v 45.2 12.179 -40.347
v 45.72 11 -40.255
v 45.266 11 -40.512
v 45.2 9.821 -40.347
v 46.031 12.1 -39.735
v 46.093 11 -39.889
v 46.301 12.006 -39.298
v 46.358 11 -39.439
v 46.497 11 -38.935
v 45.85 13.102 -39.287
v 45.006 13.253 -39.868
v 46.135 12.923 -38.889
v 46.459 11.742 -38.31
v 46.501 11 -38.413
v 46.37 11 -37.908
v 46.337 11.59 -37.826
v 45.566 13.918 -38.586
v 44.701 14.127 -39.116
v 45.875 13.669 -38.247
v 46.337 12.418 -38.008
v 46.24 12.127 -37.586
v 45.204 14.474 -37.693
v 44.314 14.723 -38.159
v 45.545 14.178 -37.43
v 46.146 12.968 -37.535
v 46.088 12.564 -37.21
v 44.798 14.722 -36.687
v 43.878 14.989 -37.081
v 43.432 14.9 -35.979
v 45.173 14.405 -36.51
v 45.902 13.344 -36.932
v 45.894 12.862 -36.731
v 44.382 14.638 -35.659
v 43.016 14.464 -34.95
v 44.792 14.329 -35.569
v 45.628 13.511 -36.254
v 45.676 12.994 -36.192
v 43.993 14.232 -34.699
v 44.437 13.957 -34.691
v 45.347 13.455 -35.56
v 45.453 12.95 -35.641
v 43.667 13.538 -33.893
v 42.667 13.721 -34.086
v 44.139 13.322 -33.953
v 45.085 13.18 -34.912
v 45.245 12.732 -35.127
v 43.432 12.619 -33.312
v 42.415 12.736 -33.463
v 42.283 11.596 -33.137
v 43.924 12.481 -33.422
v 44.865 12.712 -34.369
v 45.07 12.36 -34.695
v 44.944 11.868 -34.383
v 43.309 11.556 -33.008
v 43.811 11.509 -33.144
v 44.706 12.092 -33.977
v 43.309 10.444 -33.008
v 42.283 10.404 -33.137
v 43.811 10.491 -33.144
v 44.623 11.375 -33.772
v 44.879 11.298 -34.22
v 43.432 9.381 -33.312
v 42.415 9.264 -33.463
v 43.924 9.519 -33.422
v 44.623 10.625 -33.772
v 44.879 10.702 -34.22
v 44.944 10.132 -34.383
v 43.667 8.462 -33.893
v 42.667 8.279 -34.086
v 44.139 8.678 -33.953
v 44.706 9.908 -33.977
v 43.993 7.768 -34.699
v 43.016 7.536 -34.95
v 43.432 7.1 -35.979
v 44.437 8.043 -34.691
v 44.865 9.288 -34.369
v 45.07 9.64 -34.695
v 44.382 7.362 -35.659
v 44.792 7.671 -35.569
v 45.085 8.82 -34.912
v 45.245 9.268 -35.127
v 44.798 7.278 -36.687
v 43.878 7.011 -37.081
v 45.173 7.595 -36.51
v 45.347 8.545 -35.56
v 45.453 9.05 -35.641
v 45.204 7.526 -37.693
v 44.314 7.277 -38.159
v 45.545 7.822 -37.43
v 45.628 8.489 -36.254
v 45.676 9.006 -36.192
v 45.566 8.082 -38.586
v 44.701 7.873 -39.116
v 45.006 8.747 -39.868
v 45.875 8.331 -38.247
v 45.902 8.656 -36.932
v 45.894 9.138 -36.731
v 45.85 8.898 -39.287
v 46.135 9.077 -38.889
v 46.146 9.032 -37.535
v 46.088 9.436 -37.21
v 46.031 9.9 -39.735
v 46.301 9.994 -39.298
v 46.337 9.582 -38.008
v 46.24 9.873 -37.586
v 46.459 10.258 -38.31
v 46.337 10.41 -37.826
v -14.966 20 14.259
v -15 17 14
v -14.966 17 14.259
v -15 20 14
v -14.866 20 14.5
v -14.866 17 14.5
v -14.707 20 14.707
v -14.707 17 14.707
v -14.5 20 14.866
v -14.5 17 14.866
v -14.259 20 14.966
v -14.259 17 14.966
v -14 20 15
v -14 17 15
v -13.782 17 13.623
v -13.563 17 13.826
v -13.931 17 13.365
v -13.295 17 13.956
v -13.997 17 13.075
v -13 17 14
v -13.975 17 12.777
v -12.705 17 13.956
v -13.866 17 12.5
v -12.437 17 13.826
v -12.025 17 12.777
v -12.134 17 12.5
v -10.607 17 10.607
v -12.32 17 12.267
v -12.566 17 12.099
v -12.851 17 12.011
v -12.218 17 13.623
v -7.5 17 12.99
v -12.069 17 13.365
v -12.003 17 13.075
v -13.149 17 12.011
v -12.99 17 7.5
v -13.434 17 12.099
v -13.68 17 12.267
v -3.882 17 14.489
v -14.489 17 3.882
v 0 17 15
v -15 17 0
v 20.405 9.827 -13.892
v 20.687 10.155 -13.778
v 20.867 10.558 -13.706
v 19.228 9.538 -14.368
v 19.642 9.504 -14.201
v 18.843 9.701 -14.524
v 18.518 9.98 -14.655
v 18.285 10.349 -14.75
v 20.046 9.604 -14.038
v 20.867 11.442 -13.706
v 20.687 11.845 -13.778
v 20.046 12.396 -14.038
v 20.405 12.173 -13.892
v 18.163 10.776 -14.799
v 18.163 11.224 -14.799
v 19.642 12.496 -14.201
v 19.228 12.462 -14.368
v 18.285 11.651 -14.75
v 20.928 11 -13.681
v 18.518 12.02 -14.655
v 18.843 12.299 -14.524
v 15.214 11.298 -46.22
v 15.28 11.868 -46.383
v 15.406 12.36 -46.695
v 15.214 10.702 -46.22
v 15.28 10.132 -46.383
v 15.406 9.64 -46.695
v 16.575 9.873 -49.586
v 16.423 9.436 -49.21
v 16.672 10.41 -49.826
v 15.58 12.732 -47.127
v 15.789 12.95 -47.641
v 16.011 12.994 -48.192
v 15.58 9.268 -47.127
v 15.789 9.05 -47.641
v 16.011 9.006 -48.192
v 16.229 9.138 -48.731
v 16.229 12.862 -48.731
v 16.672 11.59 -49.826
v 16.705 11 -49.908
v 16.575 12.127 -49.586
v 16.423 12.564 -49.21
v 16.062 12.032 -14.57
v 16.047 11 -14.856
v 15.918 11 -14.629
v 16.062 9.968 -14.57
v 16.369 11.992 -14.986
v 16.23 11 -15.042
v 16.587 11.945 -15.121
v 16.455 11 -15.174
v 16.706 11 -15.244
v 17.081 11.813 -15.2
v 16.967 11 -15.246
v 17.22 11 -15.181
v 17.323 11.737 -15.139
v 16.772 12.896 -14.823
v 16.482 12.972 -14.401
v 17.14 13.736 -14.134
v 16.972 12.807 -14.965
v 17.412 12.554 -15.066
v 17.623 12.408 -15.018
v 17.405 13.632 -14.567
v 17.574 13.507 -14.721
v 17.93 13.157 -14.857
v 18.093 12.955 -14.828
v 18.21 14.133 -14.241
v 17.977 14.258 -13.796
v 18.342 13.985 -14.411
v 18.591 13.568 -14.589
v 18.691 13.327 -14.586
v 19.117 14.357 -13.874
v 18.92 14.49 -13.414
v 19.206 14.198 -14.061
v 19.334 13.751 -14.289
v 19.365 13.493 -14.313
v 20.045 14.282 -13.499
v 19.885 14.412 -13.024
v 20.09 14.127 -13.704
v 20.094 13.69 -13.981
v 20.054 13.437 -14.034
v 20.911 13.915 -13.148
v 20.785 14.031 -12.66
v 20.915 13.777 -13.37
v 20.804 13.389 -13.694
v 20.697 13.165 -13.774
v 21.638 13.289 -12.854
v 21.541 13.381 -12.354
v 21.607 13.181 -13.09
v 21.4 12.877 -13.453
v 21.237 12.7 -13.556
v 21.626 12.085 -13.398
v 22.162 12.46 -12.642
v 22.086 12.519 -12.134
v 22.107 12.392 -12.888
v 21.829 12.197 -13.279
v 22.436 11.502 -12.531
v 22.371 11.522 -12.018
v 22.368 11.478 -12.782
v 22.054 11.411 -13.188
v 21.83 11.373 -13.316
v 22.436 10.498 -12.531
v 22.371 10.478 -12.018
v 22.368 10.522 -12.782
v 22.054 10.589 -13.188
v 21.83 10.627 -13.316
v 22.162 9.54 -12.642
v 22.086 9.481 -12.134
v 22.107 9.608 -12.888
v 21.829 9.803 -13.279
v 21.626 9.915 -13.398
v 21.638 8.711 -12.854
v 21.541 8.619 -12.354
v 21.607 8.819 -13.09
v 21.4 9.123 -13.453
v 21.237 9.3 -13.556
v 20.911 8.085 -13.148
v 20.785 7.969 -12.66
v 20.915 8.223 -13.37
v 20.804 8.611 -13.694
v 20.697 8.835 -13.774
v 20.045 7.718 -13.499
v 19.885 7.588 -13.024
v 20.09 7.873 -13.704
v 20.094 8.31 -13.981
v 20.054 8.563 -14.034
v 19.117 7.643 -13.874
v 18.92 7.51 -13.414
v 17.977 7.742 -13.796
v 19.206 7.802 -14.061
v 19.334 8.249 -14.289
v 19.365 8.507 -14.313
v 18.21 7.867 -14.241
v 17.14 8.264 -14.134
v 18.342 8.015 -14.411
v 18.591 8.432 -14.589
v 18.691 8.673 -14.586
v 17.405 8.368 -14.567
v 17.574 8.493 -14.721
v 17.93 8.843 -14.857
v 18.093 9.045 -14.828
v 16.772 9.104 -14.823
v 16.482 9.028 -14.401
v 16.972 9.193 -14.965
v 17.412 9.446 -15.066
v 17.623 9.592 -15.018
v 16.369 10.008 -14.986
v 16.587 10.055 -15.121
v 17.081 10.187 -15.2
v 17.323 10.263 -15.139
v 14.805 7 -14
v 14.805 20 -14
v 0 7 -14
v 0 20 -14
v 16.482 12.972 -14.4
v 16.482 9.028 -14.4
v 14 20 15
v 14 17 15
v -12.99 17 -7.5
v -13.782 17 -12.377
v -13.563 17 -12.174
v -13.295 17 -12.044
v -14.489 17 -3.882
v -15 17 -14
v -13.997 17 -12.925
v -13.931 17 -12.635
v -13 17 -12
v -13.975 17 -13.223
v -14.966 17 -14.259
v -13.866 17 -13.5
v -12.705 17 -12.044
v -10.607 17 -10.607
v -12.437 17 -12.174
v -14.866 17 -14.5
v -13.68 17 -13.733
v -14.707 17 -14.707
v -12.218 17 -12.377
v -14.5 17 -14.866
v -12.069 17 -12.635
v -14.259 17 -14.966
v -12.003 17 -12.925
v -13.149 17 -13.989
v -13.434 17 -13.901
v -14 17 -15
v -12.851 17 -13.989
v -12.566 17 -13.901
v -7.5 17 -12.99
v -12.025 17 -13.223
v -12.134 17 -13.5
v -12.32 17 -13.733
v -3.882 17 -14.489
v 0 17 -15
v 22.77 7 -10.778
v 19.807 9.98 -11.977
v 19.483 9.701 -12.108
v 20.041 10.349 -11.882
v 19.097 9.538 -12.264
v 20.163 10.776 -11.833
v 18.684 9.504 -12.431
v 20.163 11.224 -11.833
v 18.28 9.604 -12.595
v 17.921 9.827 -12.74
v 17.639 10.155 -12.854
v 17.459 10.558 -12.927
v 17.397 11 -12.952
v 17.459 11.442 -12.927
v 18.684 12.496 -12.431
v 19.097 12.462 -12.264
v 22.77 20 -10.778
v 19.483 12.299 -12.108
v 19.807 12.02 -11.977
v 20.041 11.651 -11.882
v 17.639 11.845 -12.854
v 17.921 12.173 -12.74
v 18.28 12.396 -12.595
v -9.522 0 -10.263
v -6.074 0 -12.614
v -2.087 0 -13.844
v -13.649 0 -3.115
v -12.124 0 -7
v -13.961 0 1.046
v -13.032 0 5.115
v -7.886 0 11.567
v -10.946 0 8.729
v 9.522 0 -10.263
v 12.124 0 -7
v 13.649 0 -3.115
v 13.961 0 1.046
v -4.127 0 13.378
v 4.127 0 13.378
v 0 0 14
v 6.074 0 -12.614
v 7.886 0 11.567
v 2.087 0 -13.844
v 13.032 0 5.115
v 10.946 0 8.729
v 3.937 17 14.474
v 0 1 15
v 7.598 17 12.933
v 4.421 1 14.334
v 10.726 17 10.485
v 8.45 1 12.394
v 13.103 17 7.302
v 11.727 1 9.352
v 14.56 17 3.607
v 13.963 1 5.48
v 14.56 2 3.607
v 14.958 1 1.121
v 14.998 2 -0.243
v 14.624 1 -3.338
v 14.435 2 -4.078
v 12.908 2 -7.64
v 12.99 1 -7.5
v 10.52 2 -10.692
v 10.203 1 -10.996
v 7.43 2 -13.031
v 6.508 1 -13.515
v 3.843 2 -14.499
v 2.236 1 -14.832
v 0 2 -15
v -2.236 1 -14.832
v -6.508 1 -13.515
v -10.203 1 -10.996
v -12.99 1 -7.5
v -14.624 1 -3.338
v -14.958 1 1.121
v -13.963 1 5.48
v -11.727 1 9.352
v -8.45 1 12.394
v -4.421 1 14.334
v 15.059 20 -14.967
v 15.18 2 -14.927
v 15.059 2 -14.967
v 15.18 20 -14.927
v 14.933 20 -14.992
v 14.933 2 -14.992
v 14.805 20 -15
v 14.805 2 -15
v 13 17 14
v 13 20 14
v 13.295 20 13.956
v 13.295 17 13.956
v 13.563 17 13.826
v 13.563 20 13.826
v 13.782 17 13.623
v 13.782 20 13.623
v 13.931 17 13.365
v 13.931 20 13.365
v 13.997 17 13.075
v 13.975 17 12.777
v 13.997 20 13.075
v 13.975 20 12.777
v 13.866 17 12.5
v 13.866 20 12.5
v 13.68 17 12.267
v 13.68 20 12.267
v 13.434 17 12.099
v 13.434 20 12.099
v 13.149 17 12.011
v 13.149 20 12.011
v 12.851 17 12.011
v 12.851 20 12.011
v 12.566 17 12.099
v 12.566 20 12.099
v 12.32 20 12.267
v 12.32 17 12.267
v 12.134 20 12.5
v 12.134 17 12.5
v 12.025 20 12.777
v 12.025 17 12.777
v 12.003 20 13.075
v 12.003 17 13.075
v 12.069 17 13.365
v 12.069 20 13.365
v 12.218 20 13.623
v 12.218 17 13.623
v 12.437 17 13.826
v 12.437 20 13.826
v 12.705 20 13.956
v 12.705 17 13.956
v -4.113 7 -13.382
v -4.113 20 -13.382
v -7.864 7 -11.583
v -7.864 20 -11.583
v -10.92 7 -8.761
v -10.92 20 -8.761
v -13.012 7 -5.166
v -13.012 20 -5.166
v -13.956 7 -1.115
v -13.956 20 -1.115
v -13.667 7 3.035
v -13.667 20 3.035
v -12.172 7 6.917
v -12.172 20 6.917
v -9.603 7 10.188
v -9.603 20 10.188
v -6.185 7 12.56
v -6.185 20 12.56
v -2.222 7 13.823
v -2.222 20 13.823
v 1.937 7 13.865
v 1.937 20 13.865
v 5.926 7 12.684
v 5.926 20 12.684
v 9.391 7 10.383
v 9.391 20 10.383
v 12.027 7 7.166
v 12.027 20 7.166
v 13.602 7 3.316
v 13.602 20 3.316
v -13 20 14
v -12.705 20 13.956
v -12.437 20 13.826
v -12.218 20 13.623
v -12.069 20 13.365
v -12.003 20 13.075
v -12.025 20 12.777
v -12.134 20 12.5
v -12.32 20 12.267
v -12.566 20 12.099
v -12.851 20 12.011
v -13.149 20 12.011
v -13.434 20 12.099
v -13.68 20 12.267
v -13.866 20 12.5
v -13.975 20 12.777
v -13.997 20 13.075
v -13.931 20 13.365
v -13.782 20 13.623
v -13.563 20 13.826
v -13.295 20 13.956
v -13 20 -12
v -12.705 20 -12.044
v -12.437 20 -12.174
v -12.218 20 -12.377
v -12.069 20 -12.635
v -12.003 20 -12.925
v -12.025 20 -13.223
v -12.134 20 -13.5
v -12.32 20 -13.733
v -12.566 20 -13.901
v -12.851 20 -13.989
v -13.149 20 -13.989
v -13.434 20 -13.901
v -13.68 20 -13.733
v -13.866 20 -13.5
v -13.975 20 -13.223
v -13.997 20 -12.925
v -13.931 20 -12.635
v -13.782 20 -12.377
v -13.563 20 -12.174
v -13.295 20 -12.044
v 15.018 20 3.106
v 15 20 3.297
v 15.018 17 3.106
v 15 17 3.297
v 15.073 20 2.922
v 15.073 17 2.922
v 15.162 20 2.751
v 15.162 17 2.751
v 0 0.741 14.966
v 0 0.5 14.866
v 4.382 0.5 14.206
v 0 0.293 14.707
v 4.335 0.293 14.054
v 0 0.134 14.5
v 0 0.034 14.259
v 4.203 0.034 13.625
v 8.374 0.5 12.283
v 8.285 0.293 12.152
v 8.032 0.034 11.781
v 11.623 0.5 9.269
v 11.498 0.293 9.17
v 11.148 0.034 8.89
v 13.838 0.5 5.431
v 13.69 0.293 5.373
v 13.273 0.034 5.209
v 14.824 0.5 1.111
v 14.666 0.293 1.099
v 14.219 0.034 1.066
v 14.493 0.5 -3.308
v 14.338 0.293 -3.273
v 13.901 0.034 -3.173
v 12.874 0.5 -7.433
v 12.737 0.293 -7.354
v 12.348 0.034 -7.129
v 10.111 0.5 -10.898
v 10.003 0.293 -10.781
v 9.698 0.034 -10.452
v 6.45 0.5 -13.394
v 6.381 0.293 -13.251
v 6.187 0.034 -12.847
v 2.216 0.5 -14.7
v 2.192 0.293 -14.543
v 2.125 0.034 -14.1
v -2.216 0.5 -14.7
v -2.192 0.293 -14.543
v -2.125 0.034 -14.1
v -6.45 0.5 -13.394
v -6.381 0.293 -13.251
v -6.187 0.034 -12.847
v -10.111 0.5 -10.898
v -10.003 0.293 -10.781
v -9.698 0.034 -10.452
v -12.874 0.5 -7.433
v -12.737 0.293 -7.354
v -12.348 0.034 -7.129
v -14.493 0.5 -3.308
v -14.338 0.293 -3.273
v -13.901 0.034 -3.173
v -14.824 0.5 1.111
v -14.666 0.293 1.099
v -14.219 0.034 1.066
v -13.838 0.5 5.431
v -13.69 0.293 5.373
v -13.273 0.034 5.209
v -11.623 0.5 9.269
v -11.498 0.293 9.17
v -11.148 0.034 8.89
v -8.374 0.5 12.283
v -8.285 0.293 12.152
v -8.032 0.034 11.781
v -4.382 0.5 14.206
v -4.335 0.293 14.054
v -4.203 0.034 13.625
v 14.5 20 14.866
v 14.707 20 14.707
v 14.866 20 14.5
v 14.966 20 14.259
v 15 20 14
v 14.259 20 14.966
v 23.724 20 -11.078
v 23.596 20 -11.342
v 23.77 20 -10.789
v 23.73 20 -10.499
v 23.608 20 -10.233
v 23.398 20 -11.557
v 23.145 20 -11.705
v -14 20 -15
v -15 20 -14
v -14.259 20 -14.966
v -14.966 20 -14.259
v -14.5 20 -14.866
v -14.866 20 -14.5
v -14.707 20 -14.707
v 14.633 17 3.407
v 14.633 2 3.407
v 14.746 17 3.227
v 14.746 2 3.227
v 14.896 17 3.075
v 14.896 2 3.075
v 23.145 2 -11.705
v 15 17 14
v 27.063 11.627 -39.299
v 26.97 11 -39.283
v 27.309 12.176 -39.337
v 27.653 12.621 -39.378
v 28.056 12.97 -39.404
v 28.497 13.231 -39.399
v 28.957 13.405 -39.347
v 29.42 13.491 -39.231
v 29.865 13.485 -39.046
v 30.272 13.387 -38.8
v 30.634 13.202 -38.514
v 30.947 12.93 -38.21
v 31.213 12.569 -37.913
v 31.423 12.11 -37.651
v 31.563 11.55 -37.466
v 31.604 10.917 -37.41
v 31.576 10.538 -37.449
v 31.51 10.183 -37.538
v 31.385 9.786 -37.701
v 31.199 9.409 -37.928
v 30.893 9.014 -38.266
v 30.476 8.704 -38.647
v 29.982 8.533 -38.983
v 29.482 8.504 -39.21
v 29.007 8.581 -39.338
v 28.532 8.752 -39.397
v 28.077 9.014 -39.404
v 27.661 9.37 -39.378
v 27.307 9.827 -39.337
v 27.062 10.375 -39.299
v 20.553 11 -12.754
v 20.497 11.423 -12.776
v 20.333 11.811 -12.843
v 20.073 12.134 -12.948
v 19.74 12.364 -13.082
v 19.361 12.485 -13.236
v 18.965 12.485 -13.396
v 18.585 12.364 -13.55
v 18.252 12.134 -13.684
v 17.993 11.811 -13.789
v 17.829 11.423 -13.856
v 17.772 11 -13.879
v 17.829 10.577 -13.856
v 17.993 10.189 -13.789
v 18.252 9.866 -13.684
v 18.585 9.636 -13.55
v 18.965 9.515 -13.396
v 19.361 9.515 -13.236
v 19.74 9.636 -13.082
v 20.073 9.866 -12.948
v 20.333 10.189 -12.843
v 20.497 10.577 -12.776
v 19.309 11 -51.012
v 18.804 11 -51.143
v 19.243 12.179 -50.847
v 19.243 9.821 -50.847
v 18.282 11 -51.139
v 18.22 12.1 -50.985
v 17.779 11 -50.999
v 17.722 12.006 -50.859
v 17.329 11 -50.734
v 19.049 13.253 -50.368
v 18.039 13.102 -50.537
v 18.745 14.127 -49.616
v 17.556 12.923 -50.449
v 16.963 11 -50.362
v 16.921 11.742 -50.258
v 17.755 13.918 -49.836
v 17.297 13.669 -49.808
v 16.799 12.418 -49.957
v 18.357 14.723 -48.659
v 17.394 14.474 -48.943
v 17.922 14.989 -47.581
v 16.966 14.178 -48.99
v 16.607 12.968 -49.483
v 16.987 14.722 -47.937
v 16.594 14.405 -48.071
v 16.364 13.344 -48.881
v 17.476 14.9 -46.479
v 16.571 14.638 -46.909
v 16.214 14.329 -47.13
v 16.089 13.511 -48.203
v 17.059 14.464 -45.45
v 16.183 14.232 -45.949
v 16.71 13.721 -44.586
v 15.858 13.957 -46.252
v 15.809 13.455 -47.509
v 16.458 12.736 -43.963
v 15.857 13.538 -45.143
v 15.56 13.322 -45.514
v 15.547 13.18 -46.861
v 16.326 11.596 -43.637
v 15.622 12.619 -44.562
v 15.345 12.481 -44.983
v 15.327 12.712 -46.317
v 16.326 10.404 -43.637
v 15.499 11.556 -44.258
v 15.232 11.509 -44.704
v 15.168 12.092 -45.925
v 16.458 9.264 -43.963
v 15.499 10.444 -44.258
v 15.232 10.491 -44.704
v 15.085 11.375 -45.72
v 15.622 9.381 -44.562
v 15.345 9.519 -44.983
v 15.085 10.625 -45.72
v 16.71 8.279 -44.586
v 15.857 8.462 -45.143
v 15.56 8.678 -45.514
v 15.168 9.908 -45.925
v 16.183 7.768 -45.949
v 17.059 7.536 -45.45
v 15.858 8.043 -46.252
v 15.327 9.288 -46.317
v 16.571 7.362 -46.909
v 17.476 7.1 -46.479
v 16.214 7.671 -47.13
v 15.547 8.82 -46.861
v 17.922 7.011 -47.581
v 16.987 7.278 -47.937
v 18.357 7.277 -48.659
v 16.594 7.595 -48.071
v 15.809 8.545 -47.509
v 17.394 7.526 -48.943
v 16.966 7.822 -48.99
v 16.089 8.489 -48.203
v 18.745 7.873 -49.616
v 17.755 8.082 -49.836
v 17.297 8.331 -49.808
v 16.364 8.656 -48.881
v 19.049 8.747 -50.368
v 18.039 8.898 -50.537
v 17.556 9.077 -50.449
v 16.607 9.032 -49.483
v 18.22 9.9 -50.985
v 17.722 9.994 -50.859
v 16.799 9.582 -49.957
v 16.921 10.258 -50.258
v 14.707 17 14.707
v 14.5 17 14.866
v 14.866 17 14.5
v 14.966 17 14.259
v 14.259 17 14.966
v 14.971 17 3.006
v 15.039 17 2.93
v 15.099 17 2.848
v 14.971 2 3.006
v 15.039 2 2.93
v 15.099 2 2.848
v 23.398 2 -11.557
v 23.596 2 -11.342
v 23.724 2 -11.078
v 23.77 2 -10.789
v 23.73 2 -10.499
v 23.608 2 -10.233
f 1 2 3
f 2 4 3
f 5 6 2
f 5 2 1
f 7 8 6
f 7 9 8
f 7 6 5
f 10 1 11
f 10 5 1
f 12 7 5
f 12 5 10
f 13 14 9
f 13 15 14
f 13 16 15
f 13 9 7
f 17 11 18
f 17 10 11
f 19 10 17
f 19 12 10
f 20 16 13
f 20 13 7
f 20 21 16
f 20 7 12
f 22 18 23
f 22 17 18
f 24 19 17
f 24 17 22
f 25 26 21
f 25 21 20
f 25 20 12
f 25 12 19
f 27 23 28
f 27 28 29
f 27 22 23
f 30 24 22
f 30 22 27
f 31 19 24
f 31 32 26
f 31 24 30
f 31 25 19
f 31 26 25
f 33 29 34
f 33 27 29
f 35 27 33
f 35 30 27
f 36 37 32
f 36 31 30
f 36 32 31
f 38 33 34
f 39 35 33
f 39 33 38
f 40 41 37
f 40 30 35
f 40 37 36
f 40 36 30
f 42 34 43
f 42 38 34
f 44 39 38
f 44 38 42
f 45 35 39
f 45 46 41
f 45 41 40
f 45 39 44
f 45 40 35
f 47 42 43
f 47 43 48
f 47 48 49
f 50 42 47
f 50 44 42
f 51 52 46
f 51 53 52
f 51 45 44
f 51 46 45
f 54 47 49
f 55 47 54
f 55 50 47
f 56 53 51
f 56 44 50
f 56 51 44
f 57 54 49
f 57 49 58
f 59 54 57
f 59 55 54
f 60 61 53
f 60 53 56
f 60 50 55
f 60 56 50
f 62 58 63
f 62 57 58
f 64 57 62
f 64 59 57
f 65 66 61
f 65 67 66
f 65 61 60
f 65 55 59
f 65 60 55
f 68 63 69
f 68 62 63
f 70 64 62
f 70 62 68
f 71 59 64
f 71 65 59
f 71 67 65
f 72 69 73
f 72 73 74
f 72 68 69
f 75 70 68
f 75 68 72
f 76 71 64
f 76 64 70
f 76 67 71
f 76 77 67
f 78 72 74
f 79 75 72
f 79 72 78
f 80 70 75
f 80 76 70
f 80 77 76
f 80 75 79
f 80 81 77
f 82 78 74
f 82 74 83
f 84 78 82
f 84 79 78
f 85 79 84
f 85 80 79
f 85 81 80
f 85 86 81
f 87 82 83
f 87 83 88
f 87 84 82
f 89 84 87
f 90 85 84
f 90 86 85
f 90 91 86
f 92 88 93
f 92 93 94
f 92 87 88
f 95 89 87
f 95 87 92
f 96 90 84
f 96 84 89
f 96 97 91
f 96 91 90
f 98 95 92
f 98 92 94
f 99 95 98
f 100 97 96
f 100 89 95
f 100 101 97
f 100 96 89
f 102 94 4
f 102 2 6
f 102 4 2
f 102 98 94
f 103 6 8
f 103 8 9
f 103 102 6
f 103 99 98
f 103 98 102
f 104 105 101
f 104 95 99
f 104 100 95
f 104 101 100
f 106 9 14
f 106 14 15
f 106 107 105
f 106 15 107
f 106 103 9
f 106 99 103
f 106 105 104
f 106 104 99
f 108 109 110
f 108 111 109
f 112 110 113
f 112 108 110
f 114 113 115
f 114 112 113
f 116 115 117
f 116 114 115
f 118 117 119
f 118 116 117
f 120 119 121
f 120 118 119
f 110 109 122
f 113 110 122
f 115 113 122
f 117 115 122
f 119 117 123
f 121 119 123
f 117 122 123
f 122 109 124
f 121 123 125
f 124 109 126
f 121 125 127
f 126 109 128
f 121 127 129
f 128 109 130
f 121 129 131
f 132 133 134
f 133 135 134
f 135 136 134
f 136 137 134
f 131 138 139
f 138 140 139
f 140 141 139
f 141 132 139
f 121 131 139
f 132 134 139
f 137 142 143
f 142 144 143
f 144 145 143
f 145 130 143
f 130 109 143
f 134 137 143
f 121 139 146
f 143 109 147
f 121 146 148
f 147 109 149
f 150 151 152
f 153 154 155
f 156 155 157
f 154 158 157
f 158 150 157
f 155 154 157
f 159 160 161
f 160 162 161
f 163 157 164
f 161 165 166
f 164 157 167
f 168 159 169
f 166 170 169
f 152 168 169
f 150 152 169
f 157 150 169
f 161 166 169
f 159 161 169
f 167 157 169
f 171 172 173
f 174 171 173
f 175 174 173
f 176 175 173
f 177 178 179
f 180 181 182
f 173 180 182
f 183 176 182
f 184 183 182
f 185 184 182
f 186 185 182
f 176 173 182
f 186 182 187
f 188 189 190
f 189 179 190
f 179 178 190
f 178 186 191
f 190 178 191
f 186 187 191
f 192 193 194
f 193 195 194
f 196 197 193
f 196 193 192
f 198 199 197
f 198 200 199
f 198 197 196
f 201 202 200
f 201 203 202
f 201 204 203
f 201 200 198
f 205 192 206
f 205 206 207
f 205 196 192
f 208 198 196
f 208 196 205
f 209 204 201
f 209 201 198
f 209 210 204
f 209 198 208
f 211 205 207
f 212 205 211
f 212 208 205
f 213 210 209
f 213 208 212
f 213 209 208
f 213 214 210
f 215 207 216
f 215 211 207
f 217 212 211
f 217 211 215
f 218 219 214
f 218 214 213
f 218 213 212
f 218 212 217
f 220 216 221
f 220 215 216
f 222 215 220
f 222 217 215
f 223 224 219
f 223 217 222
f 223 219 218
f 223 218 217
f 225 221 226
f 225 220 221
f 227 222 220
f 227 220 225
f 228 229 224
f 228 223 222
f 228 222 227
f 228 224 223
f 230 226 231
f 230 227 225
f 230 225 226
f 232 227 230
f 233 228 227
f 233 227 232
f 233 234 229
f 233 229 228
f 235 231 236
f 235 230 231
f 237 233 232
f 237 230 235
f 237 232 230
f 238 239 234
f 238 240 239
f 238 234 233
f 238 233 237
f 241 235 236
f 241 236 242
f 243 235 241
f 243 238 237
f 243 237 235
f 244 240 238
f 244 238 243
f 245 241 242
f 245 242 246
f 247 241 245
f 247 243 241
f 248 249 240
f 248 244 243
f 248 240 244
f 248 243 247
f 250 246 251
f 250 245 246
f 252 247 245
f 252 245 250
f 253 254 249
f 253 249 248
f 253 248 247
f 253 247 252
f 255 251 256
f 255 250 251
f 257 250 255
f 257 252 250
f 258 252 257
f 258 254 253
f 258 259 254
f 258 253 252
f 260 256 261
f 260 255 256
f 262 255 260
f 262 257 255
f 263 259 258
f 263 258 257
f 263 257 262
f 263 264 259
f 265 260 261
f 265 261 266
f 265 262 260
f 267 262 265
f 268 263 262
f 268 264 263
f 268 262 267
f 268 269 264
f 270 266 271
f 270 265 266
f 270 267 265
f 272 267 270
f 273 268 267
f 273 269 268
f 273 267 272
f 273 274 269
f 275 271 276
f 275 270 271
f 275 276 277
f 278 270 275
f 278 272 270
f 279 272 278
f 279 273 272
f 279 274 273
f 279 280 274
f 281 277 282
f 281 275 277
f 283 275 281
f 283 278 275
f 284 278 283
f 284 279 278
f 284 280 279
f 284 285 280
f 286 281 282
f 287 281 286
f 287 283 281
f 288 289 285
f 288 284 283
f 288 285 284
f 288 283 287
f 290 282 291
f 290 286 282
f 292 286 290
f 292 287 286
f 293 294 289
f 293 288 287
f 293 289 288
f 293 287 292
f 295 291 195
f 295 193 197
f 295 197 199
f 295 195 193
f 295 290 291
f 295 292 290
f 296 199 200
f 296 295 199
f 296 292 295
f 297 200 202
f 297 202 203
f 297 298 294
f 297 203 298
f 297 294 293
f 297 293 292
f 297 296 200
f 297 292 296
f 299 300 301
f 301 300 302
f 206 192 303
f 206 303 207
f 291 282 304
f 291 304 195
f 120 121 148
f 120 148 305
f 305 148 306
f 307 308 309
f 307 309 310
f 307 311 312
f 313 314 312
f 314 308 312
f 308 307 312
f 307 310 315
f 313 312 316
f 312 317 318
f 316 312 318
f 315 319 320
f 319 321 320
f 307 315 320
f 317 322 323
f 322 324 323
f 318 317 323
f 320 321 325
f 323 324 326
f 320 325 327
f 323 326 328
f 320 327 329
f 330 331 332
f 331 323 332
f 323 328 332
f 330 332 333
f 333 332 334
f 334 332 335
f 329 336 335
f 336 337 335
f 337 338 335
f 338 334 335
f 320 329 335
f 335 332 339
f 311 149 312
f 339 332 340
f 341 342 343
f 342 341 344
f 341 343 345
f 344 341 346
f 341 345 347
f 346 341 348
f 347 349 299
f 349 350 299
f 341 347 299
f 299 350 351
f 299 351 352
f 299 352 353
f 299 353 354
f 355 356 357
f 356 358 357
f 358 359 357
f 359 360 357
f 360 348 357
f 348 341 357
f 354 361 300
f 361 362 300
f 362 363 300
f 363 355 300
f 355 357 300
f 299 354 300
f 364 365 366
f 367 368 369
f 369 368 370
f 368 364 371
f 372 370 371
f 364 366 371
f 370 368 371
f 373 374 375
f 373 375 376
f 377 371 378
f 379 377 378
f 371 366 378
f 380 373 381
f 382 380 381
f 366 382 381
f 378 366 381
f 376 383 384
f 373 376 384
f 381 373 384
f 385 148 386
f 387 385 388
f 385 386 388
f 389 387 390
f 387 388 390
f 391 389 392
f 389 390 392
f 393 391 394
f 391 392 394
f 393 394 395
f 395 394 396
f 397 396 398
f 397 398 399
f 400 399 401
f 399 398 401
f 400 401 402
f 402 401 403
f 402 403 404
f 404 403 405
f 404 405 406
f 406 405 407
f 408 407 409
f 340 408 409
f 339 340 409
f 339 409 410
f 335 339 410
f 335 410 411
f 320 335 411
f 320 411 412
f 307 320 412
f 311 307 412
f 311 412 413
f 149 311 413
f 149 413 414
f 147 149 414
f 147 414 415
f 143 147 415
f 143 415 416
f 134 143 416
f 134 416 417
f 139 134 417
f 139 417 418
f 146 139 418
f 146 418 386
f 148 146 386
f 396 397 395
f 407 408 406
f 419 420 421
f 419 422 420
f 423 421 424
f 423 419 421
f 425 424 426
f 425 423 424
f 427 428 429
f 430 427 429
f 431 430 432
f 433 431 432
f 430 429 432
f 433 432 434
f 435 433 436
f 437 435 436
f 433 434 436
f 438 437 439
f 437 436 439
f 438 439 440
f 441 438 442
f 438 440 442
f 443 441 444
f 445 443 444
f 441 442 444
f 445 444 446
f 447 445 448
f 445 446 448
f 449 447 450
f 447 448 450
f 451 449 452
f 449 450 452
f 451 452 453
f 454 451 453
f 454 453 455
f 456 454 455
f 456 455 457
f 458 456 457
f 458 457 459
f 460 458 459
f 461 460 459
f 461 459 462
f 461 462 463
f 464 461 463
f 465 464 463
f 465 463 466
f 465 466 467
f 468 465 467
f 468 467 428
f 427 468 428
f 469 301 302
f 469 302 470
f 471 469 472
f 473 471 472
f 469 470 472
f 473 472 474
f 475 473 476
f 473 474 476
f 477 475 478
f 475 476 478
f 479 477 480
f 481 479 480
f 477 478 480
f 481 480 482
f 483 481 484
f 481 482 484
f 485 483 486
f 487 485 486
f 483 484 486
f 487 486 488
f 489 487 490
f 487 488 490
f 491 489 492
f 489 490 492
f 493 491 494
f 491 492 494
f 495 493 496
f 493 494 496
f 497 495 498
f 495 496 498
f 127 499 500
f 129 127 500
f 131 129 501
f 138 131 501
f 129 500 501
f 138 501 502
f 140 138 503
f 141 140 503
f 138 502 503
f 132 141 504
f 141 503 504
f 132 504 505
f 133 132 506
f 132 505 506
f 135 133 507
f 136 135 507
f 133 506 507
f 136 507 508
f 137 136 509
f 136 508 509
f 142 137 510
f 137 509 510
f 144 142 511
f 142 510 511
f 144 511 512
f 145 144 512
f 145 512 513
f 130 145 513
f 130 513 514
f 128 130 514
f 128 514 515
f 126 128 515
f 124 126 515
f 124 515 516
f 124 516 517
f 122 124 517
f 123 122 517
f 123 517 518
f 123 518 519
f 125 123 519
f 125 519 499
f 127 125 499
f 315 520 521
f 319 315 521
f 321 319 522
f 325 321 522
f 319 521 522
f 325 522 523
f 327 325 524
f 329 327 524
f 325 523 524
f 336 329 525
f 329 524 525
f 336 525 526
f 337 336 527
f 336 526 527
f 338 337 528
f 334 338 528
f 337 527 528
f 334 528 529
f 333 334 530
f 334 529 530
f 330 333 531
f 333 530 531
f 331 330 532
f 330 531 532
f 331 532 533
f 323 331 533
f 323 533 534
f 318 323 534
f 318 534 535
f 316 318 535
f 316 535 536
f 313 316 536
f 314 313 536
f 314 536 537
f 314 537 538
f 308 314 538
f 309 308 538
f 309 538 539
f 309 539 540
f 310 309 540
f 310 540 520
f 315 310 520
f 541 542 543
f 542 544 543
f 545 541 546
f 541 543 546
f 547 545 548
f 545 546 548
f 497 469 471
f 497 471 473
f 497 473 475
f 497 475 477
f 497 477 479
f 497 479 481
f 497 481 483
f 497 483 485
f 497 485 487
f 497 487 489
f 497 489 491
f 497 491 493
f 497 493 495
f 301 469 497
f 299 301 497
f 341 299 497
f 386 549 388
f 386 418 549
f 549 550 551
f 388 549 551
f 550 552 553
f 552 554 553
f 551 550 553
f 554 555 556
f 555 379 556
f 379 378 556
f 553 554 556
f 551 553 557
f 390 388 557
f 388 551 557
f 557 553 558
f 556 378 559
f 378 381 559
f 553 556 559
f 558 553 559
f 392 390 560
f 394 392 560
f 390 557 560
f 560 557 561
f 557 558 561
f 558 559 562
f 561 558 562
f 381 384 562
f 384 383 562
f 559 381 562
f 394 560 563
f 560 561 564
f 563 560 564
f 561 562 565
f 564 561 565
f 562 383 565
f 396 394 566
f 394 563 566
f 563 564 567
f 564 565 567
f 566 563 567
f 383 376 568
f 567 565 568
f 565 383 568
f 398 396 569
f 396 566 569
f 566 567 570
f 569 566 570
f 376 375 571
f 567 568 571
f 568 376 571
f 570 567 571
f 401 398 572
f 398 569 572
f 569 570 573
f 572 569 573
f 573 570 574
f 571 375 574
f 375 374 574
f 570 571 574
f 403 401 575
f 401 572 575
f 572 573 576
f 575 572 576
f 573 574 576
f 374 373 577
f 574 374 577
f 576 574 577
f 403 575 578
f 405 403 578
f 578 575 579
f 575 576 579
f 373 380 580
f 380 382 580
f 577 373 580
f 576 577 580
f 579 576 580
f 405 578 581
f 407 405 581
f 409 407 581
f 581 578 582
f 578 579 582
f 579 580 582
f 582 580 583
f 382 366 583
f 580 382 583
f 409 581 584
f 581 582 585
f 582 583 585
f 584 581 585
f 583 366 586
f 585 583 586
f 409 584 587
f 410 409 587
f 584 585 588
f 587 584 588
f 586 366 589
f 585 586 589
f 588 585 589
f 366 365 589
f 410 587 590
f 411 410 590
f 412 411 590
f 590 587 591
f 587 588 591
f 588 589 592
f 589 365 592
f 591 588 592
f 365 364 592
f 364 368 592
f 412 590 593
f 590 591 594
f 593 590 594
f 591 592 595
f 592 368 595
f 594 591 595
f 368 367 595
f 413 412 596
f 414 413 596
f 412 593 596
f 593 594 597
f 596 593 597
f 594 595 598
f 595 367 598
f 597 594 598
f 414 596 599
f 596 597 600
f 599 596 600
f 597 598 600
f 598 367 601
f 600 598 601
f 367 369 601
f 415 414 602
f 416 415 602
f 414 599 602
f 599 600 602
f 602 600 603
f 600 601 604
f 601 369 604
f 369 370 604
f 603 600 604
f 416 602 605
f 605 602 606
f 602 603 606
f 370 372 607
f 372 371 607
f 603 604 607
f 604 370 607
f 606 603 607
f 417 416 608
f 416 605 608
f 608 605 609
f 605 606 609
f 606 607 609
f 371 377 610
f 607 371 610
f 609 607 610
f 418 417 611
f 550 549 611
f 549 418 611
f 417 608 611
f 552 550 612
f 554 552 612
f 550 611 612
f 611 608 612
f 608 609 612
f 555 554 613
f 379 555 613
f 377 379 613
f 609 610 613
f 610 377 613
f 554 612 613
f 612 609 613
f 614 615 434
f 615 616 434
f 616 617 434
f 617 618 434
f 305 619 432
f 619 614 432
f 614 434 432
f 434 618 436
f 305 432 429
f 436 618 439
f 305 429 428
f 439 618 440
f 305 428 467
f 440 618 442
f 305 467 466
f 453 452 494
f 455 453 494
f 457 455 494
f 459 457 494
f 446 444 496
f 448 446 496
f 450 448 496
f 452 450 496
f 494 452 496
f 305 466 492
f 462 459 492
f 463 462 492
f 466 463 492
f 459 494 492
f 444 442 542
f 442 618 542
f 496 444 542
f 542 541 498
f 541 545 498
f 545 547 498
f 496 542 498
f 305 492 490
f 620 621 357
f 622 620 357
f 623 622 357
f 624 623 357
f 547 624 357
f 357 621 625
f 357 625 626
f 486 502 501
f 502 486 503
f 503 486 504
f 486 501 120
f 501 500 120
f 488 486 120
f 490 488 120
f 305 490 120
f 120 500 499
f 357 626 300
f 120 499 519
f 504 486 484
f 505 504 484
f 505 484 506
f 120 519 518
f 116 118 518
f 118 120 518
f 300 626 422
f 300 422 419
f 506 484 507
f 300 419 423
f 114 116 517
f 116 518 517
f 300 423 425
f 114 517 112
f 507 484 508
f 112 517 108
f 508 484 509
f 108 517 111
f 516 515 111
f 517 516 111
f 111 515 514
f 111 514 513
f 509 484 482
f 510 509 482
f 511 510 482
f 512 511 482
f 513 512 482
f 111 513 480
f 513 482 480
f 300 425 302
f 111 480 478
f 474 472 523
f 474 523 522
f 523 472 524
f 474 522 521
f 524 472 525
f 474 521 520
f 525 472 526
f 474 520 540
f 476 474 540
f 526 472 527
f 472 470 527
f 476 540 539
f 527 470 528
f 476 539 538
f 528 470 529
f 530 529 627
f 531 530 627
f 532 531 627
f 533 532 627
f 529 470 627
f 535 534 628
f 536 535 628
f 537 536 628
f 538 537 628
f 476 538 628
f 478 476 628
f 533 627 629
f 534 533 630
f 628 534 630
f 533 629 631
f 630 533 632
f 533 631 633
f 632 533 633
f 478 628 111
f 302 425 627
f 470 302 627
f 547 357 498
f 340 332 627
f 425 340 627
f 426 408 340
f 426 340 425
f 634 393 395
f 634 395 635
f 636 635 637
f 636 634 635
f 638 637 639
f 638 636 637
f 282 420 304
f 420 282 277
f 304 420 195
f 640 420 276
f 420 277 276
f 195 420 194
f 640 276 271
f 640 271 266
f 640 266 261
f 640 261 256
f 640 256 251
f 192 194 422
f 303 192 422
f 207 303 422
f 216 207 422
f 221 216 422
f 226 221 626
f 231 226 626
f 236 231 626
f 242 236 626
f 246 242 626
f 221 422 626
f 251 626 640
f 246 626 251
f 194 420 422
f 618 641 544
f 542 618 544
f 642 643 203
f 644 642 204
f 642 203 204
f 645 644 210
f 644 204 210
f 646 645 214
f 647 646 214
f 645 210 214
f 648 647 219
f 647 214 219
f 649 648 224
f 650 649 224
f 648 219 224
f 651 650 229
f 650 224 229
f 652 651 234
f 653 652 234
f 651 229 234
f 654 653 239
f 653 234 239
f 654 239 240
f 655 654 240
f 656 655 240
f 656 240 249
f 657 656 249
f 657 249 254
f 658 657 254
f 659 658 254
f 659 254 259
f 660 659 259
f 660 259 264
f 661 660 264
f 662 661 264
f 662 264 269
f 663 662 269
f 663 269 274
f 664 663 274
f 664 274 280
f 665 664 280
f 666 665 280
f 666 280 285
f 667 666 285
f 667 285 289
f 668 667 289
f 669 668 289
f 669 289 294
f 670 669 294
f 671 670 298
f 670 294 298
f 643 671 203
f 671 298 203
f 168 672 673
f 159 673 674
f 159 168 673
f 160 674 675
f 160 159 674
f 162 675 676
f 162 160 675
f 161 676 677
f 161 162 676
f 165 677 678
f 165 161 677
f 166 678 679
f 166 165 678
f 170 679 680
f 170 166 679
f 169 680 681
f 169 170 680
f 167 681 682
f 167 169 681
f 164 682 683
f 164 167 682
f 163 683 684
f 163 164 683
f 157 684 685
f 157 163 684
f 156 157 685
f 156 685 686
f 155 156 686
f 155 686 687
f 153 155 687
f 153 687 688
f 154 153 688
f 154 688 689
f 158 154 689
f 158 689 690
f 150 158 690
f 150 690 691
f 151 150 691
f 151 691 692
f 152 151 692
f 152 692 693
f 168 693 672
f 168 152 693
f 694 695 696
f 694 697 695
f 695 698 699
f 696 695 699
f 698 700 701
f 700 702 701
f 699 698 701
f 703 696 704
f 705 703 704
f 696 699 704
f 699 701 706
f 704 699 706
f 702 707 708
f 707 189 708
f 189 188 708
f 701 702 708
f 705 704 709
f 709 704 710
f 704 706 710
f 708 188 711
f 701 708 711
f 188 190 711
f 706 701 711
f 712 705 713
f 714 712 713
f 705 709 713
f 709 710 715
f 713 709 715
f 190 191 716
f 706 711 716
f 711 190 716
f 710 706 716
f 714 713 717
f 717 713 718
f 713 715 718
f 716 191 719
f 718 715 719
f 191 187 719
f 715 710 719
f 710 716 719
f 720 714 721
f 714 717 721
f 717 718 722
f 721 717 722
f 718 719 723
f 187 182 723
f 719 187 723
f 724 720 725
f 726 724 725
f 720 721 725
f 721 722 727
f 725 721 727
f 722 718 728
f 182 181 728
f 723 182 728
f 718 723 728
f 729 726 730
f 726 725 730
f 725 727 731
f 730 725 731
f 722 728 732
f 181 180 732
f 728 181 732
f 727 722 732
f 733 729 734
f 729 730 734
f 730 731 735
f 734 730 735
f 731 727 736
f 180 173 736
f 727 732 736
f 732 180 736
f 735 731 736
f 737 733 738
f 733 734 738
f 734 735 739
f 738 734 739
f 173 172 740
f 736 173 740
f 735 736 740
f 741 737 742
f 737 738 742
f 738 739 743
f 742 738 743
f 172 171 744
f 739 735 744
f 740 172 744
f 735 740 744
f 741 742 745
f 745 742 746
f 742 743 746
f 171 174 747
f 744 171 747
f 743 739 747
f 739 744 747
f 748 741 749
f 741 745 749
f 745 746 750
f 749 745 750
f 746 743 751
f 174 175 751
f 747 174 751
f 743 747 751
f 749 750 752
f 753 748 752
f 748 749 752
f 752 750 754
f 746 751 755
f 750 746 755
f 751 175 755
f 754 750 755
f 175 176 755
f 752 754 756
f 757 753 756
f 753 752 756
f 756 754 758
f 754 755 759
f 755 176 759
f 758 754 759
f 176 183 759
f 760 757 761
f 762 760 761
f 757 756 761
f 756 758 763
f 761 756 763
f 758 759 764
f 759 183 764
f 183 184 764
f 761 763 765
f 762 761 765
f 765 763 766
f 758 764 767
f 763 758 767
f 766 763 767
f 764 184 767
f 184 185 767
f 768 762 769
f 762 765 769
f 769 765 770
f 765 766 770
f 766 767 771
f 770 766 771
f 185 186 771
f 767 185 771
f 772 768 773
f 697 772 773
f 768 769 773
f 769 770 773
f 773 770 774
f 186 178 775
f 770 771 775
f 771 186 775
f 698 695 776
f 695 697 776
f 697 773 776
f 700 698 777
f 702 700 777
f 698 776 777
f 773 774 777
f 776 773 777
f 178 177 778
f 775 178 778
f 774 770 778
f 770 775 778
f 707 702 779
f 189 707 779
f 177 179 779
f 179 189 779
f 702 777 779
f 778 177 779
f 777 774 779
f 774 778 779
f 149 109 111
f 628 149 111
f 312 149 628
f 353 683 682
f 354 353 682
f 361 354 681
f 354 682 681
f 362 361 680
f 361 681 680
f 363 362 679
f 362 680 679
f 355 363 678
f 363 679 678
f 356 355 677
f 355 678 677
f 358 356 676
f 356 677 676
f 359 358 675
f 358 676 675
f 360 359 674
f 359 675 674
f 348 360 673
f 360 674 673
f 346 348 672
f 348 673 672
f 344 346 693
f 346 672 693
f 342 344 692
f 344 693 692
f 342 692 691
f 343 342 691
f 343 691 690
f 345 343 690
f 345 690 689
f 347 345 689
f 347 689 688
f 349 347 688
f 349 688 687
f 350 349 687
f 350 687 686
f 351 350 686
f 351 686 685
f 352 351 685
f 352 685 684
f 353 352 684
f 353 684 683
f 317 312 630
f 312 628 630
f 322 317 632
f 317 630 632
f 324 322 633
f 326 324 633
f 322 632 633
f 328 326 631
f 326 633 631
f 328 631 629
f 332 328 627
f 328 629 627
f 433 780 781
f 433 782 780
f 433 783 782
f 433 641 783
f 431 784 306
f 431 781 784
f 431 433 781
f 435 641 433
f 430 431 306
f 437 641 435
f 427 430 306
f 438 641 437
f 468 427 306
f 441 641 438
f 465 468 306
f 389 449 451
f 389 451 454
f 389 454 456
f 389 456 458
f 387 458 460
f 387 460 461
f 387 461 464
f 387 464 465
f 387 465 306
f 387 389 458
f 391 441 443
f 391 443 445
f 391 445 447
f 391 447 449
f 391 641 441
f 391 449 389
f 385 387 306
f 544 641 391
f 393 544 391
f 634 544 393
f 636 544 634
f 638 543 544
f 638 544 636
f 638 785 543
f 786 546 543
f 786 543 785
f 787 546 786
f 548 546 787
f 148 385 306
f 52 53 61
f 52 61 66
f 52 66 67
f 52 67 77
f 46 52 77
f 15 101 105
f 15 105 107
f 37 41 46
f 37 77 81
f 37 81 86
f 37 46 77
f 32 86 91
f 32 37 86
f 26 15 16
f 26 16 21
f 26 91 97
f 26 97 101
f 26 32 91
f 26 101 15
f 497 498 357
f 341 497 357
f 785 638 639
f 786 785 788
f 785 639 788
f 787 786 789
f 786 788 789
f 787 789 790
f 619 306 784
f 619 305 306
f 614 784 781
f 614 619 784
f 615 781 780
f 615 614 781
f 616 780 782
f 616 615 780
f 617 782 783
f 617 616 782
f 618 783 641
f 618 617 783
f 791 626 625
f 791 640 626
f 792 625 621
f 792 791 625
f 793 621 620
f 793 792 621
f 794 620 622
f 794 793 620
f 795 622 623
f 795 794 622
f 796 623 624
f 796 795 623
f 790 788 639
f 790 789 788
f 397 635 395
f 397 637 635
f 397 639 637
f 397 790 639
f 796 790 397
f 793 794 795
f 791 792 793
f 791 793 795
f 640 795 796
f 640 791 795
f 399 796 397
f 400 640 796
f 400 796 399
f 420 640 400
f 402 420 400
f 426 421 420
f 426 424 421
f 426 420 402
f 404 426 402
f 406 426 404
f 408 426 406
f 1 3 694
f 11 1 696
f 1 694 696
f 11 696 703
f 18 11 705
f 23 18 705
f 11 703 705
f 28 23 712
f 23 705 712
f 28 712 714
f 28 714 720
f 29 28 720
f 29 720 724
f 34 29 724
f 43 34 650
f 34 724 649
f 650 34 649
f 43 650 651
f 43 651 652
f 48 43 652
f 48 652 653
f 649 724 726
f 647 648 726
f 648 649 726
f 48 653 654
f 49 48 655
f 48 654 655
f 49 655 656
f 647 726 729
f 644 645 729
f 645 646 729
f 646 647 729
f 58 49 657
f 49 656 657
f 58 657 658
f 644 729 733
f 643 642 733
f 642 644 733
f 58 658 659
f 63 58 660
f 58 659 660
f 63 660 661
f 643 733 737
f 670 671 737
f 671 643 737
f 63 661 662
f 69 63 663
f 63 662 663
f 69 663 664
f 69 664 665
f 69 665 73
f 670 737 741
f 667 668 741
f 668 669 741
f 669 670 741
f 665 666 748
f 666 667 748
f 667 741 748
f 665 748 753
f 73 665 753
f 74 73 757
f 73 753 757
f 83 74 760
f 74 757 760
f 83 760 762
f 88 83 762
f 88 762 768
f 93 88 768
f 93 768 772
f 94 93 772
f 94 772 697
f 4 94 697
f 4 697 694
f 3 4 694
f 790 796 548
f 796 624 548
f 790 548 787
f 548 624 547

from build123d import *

# Parameters (mm, degrees)
SKETCH1_R                = 15
BOSS_EXTRUDE1_DEPTH      = 17
SKETCH2_W                = 30
SKETCH2_H                = 30
BOSS_EXTRUDE2_DEPTH      = 3
FILLET2_R                = 1
BOSS_EXTRUDE4_DEPTH      = 3
BOSS_EXTRUDE5_DEPTH      = 18
FILLET5_R                = 1
FILLET6_R                = 1
FILLET7_R                = 1
SKETCH7_R                = 14
CUT_EXTRUDE1_DEPTH       = 13
SKETCH8_R                = 1.5
CUT_EXTRUDE2_DEPTH       = 13
SKETCH9_R                = 3.5
BOSS_EXTRUDE6_DEPTH      = 1
CUT_EXTRUDE3_START       = -1
SKETCH10_R               = 1.5
CUT_EXTRUDE3_DEPTH       = 1
FILLET8_R                = 1
SKETCH13_R               = 1
CUT_EXTRUDE4_DEPTH       = 35.607752779
SKETCH14_R               = 2.5
BOSS_EXTRUDE7_DEPTH      = 30
BOSS_EXTRUDE8_DEPTH      = 16
BOSS_EXTRUDE8_DEPTH_BACK = 16
SKETCH17_R               = 4
FILLET9_R                = 2


# Some blends are built 0.0001 mm under size
with BuildPart() as part:
    # Sketch1 → Boss-Extrude1 (new body)
    with BuildSketch(Plane(origin=(0, 0, 0), x_dir=(1, 0, 0), z_dir=(0, 1, 0))):
        with Locations(Location((0, 0, 0), (0, 0, 270))):
            Circle(SKETCH1_R)
    extrude(amount=BOSS_EXTRUDE1_DEPTH)

    # Sketch2 → Boss-Extrude2 (add)
    with BuildSketch(Plane(origin=(0, 17, 0), x_dir=(1, 0, 0), z_dir=(0, 1, 0))):
        Rectangle(SKETCH2_W, SKETCH2_H)
    extrude(amount=BOSS_EXTRUDE2_DEPTH)

    # Fillet2
    fillet2_edges = [part.edges().sort_by_distance(p)[0] for p in [
        (0, 0, -15),
    ]]
    fillet(fillet2_edges, radius=FILLET2_R)

    # Sketch4 → Boss-Extrude4 (add)
    with BuildSketch(Plane(origin=(0, 20, 0), x_dir=(1, 0, 0), z_dir=(0, 1, 0))):
        Polygon((15, 15), (24.270248109, 11.25), (15, -3), align=None)
    extrude(amount=-BOSS_EXTRUDE4_DEPTH)

    # Sketch6 → Boss-Extrude5 (add)
    with BuildSketch(Plane(origin=(0, 20, 0), x_dir=(1, 0, 0), z_dir=(0, 1, 0))):
        Polygon((15, -3), (0, -3), (0, 15), (15, 15), (24.270248109, 11.25), align=None)
    extrude(amount=-BOSS_EXTRUDE5_DEPTH)

    # Fillet5
    fillet5_edges = [part.edges().sort_by_distance(p)[0] for p in [
        (15, 18.5, 3),
        (24.270248109, 11, -11.25),
        (15, 18.5, 15),
        (15, 11, -15),
        (-15, 18.5, -15),
        (-15, 18.5, 15),
    ]]
    fillet(fillet5_edges, radius=FILLET5_R)

    # Fillet6
    # the kernel refuses this fillet: 1 mm, written as the material it adds along each edge
    with BuildSketch(Plane(origin=(14.696938457, 18.556304537, 3), x_dir=(-0.2202884134263797, 0, 0.9754347824996238), z_dir=(0, -1, 0))) as fillet6_piece_1:
        with BuildLine():
            CenterArc((0.643272542, -0.99978468), FILLET6_R, 91.189014428, 44.048625674)
            Line((-0.066760947, -0.295616771), (-0.080961616, -0.281533412))
            ThreePointArc((-0.080961616, -0.281533412), (-0.052889169, -0.143402617), (-0.019508696, 0.004405768))
            Line((-0.019508696, 0.004405768), (0.000415015, 0.019995694))
            ThreePointArc((0.000415015, 0.019995694), (0.311260907, 0.016770207), (0.6221068, 0.019995694))
            Line((0.6221068, 0.019995694), (0.622521815, 0))
        make_face()
    extrude(amount=16.556304537)

    # Fillet7
    fillet7_edges = [part.edges().sort_by_distance(p)[0] for p in [
        (15, 9.5, 3),
    ]]
    fillet(fillet7_edges, radius=FILLET7_R)

    # Sketch7 → Cut-Extrude1 (cut)
    with BuildSketch(Plane(origin=(0, 20, 0), x_dir=(1, 0, 0), z_dir=(0, 1, 0))):
        with BuildLine():
            Line((14.805399496, 14), (0, 14))
            ThreePointArc((0, 14), (9.899494937, 9.899494937), (14, 0))
            ThreePointArc((14, 0), (13.900075645, -1.66969969), (13.601728992, -3.31556457))
            Line((13.601728992, -3.31556457), (22.770248109, 10.778060096))
            Line((22.770248109, 10.778060096), (14.805399496, 14))
        make_face()
        Circle(SKETCH7_R)
    extrude(amount=-CUT_EXTRUDE1_DEPTH, mode=Mode.SUBTRACT)

    # Sketch8 → Cut-Extrude2 (cut)
    with BuildSketch(Plane(origin=(7.323889561, 0, -18.105139561), x_dir=(-0.927024810886958, 0, -0.3749999999999998), z_dir=(0.3749999999999998, 0, -0.927024810886958))):
        with Locations((-12.770892539, 11)):
            Circle(SKETCH8_R)
    extrude(amount=-CUT_EXTRUDE2_DEPTH, mode=Mode.SUBTRACT)

    # Sketch9 → Boss-Extrude6 (add)
    with BuildSketch(Plane(origin=(7.323889561, 0, -18.105139561), x_dir=(-0.927024810886958, 0, -0.3749999999999998), z_dir=(0.3749999999999998, 0, -0.927024810886958))):
        with Locations((-12.770892539, 11)):
            Circle(SKETCH9_R)
    extrude(amount=BOSS_EXTRUDE6_DEPTH)

    # Sketch10 → Cut-Extrude3 (cut)
    with BuildSketch(Plane(origin=(7.323889561, 0, -18.105139561), x_dir=(0.927024810886958, 0, 0.3749999999999998), z_dir=(-0.3749999999999998, 0, 0.927024810886958)).offset(CUT_EXTRUDE3_START)):
        with Locations((12.770892539, 11)):
            Circle(SKETCH10_R)
    extrude(amount=CUT_EXTRUDE3_DEPTH, mode=Mode.SUBTRACT)

    # Fillet8
    fillet8_edges = [part.edges().sort_by_distance(p)[0] for p in [
        (22.78241064, 11, -12.93057967),
    ]]
    fillet(fillet8_edges, radius=FILLET8_R - 0.0001)  # a hair under: the kernel refuses the full size

    # Sketch13 → Cut-Extrude4 (cut, through all)
    with BuildSketch(Plane(origin=(0, 20, 0), x_dir=(1, 0, 0), z_dir=(0, 1, 0))):
        with Locations(Location((-13, 13, 0), (0, 0, 270))):
            Circle(SKETCH13_R)
        with Locations(Location((-13, -13, 0), (0, 0, 270))):
            Circle(SKETCH13_R)
        with Locations(Location((13, -13, 0), (0, 0, 270))):
            Circle(SKETCH13_R)
    extrude(amount=-CUT_EXTRUDE4_DEPTH, mode=Mode.SUBTRACT)

    # Sketch14 → Boss-Extrude7 (add)
    with BuildSketch(Plane(origin=(7.698889561, 0, -19.032164372), x_dir=(-0.927024810886958, 0, -0.3749999999999998), z_dir=(0.3749999999999998, 0, -0.927024810886958))):
        with Locations((-12.770892539, 11)):
            Circle(SKETCH14_R)
    extrude(amount=BOSS_EXTRUDE7_DEPTH)

    # Sketch17 → Boss-Extrude8 (add, two sides: drawn at the far end of the back side and taken through both)
    with BuildSketch(Plane(origin=(11.838934241, 0, 4.789084702), x_dir=(0.3749999999999998, 0, -0.927024810886958), z_dir=(0.927024810886958, 0, 0.3749999999999998)).offset(-BOSS_EXTRUDE8_DEPTH_BACK)):
        with Locations((50.530372163, 11)):
            Circle(SKETCH17_R)
    extrude(amount=BOSS_EXTRUDE8_DEPTH + BOSS_EXTRUDE8_DEPTH_BACK)

    # Fillet9
    fillet9_edges = [part.edges().sort_by_distance(p)[0] for p in [
        (14.455426828, 11, -44.345724753),
        (44.120220776, 11, -32.345724753),
    ]]
    fillet(fillet9_edges, radius=FILLET9_R)


solid = part.part
